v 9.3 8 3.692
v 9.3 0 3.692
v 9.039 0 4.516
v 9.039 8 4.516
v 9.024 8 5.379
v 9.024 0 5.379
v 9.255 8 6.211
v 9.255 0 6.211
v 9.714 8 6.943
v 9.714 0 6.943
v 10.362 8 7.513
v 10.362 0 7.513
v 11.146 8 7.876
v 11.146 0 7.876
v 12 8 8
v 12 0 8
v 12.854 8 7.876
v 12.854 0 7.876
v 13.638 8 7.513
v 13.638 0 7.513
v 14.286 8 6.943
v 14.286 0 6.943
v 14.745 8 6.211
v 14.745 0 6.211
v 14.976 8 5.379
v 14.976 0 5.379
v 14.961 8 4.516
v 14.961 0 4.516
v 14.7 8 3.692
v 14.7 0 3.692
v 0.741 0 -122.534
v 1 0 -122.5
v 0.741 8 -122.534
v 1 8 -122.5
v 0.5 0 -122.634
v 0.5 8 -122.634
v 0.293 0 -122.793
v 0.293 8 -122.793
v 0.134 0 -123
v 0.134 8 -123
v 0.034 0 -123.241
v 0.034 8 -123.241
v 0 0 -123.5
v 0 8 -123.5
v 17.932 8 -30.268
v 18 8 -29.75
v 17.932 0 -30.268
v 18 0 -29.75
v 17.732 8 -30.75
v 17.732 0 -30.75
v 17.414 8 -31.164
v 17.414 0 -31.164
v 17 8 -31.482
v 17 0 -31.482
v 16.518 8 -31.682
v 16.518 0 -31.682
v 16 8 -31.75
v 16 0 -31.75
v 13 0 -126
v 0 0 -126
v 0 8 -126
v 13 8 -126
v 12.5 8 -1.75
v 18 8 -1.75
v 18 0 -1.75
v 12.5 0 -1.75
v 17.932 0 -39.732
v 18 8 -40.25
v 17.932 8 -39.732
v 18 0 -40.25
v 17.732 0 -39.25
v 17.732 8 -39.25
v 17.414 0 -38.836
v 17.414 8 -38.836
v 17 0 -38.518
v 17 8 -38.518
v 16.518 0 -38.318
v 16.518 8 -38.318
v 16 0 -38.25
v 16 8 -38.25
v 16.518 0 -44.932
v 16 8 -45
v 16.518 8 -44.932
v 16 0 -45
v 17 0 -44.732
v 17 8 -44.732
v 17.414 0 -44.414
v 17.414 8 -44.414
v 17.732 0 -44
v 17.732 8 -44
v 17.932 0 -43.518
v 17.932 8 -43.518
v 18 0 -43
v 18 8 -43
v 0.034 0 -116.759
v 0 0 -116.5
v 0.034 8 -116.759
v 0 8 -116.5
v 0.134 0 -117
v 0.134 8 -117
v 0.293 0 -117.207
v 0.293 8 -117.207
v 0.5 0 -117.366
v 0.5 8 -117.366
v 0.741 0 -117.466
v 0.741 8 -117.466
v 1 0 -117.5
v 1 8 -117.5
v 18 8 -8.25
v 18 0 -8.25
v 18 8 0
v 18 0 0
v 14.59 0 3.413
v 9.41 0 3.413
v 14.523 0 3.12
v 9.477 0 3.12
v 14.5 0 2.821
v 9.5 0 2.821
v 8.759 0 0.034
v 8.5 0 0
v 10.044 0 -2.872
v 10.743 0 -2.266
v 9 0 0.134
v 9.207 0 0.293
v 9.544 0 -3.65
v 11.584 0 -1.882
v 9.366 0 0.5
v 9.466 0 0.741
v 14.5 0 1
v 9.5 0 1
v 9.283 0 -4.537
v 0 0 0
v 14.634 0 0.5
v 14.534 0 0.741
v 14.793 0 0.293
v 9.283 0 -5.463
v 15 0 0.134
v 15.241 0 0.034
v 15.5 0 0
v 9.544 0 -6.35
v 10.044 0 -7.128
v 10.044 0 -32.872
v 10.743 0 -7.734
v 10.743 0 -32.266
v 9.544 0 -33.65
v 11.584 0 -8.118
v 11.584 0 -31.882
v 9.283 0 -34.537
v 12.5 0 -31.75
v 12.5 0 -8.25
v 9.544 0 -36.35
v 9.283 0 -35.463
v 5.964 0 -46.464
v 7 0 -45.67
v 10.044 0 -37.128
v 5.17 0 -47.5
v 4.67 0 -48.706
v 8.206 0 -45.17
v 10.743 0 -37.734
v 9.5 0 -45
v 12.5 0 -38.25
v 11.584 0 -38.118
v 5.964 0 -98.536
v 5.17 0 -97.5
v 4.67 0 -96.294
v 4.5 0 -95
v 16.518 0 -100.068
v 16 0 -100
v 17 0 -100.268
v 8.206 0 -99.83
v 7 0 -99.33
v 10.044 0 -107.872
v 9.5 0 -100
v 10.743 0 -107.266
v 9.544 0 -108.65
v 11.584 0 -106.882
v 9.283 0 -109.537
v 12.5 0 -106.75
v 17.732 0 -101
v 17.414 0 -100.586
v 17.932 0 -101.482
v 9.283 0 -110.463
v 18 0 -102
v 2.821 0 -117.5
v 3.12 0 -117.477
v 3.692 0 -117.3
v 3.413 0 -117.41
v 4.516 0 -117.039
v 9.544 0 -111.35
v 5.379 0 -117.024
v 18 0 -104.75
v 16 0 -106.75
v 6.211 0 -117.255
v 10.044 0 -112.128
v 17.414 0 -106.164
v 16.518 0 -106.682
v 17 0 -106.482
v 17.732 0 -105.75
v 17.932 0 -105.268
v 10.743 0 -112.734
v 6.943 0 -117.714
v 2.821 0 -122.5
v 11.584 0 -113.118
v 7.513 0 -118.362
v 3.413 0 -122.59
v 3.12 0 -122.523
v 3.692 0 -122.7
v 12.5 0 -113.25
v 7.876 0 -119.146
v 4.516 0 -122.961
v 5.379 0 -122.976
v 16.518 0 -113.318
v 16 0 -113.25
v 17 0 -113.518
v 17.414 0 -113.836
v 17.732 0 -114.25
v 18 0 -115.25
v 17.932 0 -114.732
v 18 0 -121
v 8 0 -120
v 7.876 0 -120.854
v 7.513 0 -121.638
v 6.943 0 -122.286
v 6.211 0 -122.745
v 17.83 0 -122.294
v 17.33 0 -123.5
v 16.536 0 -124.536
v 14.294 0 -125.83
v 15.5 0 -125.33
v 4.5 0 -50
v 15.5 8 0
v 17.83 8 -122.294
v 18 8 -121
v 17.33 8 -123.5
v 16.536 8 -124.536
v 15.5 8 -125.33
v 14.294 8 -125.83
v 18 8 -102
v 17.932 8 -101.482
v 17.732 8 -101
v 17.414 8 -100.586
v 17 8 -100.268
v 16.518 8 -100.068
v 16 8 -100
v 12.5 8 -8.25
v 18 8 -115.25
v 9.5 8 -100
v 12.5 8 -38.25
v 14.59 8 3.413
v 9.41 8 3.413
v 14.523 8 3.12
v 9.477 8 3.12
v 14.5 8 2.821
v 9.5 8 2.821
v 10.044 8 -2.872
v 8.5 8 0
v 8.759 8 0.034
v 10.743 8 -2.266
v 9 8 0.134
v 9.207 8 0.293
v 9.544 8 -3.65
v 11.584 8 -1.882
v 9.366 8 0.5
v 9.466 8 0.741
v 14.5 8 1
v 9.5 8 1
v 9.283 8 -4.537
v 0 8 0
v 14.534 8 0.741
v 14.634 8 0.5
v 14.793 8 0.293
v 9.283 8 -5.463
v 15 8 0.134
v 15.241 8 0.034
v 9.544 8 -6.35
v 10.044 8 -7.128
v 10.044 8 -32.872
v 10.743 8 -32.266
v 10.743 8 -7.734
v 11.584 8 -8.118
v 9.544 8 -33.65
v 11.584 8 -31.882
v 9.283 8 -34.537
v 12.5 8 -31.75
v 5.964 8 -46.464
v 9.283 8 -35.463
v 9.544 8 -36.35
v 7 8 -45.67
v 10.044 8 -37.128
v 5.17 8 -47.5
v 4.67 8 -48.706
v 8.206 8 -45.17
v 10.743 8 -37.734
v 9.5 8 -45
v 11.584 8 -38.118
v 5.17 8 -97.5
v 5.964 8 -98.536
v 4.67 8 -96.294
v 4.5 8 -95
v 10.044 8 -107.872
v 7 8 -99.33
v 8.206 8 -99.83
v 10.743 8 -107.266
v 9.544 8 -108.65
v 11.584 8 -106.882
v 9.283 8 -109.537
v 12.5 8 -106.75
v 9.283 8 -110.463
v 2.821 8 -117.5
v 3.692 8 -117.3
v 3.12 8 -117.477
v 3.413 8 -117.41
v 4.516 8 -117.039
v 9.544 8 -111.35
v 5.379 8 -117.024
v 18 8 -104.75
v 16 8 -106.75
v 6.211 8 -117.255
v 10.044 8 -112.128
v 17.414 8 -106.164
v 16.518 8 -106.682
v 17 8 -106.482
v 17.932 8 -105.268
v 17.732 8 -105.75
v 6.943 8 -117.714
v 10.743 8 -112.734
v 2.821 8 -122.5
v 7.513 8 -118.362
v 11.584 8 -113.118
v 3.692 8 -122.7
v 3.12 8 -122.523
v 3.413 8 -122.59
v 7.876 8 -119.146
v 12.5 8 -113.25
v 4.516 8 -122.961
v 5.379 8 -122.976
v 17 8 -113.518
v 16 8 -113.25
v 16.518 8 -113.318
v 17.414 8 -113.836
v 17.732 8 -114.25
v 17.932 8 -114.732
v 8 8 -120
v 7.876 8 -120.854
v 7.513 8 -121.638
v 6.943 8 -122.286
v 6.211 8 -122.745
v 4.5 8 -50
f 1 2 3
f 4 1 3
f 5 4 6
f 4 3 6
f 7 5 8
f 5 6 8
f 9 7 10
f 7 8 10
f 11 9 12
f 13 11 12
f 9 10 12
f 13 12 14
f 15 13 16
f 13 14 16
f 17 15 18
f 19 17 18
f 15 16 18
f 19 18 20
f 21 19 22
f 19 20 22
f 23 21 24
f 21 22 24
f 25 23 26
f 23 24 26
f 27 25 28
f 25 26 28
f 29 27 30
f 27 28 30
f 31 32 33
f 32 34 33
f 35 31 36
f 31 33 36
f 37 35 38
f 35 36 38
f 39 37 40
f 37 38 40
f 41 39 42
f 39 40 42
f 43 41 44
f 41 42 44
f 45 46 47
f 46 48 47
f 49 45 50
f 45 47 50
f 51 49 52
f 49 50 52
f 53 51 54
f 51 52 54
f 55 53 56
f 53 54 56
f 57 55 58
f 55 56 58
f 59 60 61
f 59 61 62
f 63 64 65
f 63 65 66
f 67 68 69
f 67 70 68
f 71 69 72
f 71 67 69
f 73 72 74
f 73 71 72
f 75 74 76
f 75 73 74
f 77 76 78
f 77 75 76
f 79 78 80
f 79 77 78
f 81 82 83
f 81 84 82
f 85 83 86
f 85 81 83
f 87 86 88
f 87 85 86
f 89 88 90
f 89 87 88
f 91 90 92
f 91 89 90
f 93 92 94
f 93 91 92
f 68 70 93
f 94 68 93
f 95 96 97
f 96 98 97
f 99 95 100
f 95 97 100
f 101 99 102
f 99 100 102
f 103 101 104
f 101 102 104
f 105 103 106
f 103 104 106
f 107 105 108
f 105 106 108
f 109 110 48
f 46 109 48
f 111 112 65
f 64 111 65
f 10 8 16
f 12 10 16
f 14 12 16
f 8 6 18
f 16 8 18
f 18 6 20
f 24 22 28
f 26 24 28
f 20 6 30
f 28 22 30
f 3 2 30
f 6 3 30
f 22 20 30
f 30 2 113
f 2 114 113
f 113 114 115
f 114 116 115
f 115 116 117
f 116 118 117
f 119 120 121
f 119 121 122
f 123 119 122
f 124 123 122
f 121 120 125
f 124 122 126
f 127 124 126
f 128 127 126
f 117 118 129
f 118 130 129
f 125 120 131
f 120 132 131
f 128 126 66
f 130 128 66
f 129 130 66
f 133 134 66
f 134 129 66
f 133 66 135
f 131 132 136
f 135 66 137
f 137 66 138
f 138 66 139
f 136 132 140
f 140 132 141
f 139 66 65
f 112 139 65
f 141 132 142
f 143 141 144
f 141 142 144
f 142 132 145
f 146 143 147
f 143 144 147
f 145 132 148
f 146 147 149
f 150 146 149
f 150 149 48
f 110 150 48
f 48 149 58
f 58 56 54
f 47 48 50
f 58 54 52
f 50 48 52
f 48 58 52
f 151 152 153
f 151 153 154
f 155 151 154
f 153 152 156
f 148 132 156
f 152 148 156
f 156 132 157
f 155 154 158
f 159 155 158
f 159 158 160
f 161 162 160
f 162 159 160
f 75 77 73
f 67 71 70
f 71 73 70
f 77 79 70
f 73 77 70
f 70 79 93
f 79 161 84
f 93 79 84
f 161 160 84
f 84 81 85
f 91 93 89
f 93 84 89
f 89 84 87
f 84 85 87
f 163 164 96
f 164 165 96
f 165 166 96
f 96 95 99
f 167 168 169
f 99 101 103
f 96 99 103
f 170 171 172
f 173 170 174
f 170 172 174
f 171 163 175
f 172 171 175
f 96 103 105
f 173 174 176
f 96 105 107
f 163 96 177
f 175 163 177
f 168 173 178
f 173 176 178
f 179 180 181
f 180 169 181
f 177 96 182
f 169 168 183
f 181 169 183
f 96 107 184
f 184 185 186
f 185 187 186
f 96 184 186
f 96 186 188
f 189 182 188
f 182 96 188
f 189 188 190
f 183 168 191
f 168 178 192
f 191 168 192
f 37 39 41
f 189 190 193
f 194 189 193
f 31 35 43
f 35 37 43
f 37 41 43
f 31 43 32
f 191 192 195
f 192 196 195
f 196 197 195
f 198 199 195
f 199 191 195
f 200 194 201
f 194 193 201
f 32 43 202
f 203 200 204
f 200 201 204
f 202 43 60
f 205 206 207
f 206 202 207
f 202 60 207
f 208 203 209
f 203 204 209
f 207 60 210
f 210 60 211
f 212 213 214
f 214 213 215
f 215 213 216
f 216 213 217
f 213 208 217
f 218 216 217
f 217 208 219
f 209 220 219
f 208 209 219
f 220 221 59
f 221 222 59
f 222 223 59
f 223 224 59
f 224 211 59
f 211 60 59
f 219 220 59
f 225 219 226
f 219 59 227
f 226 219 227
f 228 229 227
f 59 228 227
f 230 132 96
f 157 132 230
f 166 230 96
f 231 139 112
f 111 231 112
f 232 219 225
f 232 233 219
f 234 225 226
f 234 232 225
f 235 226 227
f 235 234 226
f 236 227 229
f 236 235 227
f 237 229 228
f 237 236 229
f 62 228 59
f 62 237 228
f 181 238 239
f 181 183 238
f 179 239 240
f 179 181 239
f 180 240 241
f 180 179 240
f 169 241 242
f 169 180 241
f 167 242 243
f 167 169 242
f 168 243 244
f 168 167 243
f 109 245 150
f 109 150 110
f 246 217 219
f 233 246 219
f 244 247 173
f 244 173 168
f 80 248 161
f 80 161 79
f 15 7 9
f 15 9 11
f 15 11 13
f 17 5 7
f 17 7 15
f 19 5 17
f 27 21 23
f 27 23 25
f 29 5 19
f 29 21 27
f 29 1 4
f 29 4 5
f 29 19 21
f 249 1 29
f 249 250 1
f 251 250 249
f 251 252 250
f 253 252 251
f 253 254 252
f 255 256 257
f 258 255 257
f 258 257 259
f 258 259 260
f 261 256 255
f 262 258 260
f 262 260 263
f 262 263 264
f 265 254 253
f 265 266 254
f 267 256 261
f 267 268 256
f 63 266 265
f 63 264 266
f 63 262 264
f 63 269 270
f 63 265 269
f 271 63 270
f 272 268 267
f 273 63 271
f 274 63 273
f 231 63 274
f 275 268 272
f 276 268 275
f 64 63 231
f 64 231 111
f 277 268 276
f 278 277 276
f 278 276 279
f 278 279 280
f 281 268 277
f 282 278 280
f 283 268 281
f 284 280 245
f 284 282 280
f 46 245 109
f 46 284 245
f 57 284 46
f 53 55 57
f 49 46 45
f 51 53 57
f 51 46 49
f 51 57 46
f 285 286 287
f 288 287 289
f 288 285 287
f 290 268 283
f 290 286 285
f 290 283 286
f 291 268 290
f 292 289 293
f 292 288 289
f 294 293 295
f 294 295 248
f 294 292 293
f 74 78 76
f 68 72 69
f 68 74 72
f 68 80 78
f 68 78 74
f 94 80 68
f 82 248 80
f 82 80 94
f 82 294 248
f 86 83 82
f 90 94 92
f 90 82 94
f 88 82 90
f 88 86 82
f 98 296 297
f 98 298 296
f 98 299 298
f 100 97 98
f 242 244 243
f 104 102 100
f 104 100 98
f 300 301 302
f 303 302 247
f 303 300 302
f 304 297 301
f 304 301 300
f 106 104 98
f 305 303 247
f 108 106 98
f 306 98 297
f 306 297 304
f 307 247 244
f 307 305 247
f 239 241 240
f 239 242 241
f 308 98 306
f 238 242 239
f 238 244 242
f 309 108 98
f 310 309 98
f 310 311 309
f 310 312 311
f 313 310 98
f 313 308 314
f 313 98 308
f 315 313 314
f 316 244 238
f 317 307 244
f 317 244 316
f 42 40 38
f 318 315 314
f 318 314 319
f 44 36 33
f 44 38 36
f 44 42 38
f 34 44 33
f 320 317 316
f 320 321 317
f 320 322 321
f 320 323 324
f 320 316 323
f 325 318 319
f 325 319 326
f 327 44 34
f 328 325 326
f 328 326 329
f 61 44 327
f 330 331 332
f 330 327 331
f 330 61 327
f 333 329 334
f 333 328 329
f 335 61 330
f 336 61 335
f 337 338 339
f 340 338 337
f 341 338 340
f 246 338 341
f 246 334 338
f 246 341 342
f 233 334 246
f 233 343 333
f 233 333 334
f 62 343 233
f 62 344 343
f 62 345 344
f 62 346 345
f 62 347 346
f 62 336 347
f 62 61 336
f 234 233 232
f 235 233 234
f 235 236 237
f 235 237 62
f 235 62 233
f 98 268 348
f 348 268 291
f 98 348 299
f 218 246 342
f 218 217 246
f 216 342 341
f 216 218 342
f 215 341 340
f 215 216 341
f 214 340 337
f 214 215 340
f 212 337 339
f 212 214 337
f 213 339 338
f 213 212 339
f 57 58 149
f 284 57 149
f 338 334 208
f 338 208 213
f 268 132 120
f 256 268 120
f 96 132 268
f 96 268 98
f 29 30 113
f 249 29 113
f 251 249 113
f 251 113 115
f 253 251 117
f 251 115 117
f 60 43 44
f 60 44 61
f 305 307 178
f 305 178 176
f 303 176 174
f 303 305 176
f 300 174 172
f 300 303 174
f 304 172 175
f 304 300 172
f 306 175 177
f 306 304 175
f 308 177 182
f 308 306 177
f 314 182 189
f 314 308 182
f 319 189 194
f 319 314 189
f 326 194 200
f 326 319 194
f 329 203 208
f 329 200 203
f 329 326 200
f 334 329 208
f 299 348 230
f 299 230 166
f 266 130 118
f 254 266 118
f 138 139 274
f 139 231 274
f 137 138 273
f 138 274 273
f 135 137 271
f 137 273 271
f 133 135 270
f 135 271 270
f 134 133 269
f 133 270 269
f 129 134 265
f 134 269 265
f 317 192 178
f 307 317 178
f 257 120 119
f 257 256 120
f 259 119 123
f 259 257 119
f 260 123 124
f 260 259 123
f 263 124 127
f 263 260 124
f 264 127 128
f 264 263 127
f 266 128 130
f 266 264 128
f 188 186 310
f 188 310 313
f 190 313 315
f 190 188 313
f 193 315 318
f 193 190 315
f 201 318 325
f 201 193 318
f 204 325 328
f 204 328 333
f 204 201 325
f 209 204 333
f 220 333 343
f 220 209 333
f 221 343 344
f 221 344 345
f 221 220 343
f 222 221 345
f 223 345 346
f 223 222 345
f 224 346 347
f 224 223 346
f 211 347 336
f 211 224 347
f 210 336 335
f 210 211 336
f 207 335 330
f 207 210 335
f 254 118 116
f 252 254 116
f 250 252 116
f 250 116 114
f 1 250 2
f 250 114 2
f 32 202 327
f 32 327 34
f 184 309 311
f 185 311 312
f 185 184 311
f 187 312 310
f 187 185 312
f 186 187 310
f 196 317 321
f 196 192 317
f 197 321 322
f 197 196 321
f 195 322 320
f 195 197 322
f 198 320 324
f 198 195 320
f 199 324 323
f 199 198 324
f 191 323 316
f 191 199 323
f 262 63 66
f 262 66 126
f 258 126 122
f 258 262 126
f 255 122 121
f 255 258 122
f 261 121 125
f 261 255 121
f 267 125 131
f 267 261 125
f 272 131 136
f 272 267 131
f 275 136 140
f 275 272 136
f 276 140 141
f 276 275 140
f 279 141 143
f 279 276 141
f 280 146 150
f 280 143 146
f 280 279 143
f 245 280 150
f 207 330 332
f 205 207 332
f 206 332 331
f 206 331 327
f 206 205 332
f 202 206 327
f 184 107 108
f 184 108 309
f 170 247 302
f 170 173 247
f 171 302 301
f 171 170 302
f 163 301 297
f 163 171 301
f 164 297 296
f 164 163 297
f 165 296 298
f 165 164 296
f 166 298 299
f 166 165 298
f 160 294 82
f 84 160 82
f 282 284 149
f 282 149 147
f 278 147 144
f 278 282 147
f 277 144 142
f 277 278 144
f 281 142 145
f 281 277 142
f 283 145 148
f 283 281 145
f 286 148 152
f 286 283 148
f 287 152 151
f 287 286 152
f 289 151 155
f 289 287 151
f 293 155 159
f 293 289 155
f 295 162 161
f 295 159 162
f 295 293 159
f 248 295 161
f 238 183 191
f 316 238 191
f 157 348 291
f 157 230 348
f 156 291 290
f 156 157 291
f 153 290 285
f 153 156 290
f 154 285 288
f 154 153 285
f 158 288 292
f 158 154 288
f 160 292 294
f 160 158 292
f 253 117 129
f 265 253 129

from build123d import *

# Parameters (mm, degrees)
SKETCH_1_W          = 18
SKETCH_1_H          = 126
EXTRUDE_1_DEPTH     = 8
SKETCH_5_W          = 13.5
SKETCH_5_H          = 55
CUT_EXTRUDE_3_DEPTH = 10
CUT_EXTRUDE_1_DEPTH = 10
FILLET_1_R          = 5
FILLET_2_R          = 5
FILLET_3_R          = 2
CUT_EXTRUDE_4_DEPTH = 8
EXTRUDE_3_DEPTH     = 8
FILLET_4_R          = 1


with BuildPart() as part:
    # 스케치1 → 보스-돌출1 (new body)
    with BuildSketch(Plane(origin=(0, 0, 0), x_dir=(1, 0, 0), z_dir=(0, 1, 0))):
        with Locations((9, 63)):
            Rectangle(SKETCH_1_W, SKETCH_1_H)
    extrude(amount=EXTRUDE_1_DEPTH)

    # 스케치5 → 컷-돌출3 (cut)
    with BuildSketch(Plane(origin=(0, 8, 0), x_dir=(1, 0, 0), z_dir=(0, 1, 0))):
        with Locations((11.25, 72.5)):
            Rectangle(SKETCH_5_W, SKETCH_5_H)
    extrude(amount=-CUT_EXTRUDE_3_DEPTH, mode=Mode.SUBTRACT)

    # 스케치2 → 컷-돌출1 (cut)
    with BuildSketch(Plane(origin=(0, 8, 0), x_dir=(1, 0, 0), z_dir=(0, 1, 0))):
        with BuildLine():
            Line((12.5, 8.25), (18, 8.25))
            ThreePointArc((18, 8.25), (21.25, 5), (18, 1.75))
            Line((18, 1.75), (12.5, 1.75))
            ThreePointArc((12.5, 1.75), (9.25, 5), (12.5, 8.25))
        make_face()
        with BuildLine():
            Line((12.5, 113.25), (18, 113.25))
            ThreePointArc((18, 113.25), (21.25, 110), (18, 106.75))
            Line((18, 106.75), (12.5, 106.75))
            ThreePointArc((12.5, 106.75), (9.25, 110), (12.5, 113.25))
        make_face()
        with BuildLine():
            Line((12.5, 38.25), (18, 38.25))
            ThreePointArc((18, 38.25), (21.25, 35), (18, 31.75))
            Line((18, 31.75), (12.5, 31.75))
            ThreePointArc((12.5, 31.75), (9.25, 35), (12.5, 38.25))
        make_face()
    extrude(amount=-CUT_EXTRUDE_1_DEPTH, mode=Mode.SUBTRACT)

    # 필렛1
    fillet_1_edges = [part.edges().sort_by_distance(p)[0] for p in [
        (4.5, 4, -45),
        (4.5, 4, -100),
    ]]
    fillet(fillet_1_edges, radius=FILLET_1_R)

    # 필렛2
    fillet_2_edges = [part.edges().sort_by_distance(p)[0] for p in [
        (18, 4, -126),
    ]]
    fillet(fillet_2_edges, radius=FILLET_2_R)

    # 필렛3
    fillet_3_edges = [part.edges().sort_by_distance(p)[0] for p in [
        (18, 4, -100),
        (18, 4, -45),
        (18, 4, -113.25),
        (18, 4, -106.75),
        (18, 4, -38.25),
        (18, 4, -31.75),
    ]]
    fillet(fillet_3_edges, radius=FILLET_3_R)

    # 스케치6 → 컷-돌출4 (cut)
    with BuildSketch(Plane.XZ):
        with BuildLine():
            Line((0, -117.5), (2.820550528, -117.5))
            ThreePointArc((2.820550528, -117.5), (3.267764124, -117.449358869), (3.692330317, -117.3))
            ThreePointArc((3.692330317, -117.3), (8, -120), (3.692330317, -122.7))
            ThreePointArc((3.692330317, -122.7), (3.267764124, -122.550641131), (2.820550528, -122.5))
            Line((2.820550528, -122.5), (0, -122.5))
            Line((0, -122.5), (0, -117.5))
        make_face()
    extrude(amount=-CUT_EXTRUDE_4_DEPTH, mode=Mode.SUBTRACT)

    # 스케치7 → 보스-돌출3 (add)
    with BuildSketch(Plane.XZ):
        with BuildLine():
            Line((9.5, 0), (9.5, 2.820550528))
            ThreePointArc((9.5, 2.820550528), (9.449358869, 3.267764124), (9.3, 3.692330317))
            ThreePointArc((9.3, 3.692330317), (12, 8), (14.7, 3.692330317))
            ThreePointArc((14.7, 3.692330317), (14.550641131, 3.267764124), (14.5, 2.820550528))
            Line((14.5, 2.820550528), (14.5, 0))
            Line((14.5, 0), (9.5, 0))
        make_face()
    extrude(amount=-EXTRUDE_3_DEPTH)

    # 필렛4
    fillet_4_edges = [part.edges().sort_by_distance(p)[0] for p in [
        (0, 4, -117.5),
        (0, 4, -122.5),
        (9.5, 4, 0),
        (14.5, 4, 0),
    ]]
    fillet(fillet_4_edges, radius=FILLET_4_R)


solid = part.part
